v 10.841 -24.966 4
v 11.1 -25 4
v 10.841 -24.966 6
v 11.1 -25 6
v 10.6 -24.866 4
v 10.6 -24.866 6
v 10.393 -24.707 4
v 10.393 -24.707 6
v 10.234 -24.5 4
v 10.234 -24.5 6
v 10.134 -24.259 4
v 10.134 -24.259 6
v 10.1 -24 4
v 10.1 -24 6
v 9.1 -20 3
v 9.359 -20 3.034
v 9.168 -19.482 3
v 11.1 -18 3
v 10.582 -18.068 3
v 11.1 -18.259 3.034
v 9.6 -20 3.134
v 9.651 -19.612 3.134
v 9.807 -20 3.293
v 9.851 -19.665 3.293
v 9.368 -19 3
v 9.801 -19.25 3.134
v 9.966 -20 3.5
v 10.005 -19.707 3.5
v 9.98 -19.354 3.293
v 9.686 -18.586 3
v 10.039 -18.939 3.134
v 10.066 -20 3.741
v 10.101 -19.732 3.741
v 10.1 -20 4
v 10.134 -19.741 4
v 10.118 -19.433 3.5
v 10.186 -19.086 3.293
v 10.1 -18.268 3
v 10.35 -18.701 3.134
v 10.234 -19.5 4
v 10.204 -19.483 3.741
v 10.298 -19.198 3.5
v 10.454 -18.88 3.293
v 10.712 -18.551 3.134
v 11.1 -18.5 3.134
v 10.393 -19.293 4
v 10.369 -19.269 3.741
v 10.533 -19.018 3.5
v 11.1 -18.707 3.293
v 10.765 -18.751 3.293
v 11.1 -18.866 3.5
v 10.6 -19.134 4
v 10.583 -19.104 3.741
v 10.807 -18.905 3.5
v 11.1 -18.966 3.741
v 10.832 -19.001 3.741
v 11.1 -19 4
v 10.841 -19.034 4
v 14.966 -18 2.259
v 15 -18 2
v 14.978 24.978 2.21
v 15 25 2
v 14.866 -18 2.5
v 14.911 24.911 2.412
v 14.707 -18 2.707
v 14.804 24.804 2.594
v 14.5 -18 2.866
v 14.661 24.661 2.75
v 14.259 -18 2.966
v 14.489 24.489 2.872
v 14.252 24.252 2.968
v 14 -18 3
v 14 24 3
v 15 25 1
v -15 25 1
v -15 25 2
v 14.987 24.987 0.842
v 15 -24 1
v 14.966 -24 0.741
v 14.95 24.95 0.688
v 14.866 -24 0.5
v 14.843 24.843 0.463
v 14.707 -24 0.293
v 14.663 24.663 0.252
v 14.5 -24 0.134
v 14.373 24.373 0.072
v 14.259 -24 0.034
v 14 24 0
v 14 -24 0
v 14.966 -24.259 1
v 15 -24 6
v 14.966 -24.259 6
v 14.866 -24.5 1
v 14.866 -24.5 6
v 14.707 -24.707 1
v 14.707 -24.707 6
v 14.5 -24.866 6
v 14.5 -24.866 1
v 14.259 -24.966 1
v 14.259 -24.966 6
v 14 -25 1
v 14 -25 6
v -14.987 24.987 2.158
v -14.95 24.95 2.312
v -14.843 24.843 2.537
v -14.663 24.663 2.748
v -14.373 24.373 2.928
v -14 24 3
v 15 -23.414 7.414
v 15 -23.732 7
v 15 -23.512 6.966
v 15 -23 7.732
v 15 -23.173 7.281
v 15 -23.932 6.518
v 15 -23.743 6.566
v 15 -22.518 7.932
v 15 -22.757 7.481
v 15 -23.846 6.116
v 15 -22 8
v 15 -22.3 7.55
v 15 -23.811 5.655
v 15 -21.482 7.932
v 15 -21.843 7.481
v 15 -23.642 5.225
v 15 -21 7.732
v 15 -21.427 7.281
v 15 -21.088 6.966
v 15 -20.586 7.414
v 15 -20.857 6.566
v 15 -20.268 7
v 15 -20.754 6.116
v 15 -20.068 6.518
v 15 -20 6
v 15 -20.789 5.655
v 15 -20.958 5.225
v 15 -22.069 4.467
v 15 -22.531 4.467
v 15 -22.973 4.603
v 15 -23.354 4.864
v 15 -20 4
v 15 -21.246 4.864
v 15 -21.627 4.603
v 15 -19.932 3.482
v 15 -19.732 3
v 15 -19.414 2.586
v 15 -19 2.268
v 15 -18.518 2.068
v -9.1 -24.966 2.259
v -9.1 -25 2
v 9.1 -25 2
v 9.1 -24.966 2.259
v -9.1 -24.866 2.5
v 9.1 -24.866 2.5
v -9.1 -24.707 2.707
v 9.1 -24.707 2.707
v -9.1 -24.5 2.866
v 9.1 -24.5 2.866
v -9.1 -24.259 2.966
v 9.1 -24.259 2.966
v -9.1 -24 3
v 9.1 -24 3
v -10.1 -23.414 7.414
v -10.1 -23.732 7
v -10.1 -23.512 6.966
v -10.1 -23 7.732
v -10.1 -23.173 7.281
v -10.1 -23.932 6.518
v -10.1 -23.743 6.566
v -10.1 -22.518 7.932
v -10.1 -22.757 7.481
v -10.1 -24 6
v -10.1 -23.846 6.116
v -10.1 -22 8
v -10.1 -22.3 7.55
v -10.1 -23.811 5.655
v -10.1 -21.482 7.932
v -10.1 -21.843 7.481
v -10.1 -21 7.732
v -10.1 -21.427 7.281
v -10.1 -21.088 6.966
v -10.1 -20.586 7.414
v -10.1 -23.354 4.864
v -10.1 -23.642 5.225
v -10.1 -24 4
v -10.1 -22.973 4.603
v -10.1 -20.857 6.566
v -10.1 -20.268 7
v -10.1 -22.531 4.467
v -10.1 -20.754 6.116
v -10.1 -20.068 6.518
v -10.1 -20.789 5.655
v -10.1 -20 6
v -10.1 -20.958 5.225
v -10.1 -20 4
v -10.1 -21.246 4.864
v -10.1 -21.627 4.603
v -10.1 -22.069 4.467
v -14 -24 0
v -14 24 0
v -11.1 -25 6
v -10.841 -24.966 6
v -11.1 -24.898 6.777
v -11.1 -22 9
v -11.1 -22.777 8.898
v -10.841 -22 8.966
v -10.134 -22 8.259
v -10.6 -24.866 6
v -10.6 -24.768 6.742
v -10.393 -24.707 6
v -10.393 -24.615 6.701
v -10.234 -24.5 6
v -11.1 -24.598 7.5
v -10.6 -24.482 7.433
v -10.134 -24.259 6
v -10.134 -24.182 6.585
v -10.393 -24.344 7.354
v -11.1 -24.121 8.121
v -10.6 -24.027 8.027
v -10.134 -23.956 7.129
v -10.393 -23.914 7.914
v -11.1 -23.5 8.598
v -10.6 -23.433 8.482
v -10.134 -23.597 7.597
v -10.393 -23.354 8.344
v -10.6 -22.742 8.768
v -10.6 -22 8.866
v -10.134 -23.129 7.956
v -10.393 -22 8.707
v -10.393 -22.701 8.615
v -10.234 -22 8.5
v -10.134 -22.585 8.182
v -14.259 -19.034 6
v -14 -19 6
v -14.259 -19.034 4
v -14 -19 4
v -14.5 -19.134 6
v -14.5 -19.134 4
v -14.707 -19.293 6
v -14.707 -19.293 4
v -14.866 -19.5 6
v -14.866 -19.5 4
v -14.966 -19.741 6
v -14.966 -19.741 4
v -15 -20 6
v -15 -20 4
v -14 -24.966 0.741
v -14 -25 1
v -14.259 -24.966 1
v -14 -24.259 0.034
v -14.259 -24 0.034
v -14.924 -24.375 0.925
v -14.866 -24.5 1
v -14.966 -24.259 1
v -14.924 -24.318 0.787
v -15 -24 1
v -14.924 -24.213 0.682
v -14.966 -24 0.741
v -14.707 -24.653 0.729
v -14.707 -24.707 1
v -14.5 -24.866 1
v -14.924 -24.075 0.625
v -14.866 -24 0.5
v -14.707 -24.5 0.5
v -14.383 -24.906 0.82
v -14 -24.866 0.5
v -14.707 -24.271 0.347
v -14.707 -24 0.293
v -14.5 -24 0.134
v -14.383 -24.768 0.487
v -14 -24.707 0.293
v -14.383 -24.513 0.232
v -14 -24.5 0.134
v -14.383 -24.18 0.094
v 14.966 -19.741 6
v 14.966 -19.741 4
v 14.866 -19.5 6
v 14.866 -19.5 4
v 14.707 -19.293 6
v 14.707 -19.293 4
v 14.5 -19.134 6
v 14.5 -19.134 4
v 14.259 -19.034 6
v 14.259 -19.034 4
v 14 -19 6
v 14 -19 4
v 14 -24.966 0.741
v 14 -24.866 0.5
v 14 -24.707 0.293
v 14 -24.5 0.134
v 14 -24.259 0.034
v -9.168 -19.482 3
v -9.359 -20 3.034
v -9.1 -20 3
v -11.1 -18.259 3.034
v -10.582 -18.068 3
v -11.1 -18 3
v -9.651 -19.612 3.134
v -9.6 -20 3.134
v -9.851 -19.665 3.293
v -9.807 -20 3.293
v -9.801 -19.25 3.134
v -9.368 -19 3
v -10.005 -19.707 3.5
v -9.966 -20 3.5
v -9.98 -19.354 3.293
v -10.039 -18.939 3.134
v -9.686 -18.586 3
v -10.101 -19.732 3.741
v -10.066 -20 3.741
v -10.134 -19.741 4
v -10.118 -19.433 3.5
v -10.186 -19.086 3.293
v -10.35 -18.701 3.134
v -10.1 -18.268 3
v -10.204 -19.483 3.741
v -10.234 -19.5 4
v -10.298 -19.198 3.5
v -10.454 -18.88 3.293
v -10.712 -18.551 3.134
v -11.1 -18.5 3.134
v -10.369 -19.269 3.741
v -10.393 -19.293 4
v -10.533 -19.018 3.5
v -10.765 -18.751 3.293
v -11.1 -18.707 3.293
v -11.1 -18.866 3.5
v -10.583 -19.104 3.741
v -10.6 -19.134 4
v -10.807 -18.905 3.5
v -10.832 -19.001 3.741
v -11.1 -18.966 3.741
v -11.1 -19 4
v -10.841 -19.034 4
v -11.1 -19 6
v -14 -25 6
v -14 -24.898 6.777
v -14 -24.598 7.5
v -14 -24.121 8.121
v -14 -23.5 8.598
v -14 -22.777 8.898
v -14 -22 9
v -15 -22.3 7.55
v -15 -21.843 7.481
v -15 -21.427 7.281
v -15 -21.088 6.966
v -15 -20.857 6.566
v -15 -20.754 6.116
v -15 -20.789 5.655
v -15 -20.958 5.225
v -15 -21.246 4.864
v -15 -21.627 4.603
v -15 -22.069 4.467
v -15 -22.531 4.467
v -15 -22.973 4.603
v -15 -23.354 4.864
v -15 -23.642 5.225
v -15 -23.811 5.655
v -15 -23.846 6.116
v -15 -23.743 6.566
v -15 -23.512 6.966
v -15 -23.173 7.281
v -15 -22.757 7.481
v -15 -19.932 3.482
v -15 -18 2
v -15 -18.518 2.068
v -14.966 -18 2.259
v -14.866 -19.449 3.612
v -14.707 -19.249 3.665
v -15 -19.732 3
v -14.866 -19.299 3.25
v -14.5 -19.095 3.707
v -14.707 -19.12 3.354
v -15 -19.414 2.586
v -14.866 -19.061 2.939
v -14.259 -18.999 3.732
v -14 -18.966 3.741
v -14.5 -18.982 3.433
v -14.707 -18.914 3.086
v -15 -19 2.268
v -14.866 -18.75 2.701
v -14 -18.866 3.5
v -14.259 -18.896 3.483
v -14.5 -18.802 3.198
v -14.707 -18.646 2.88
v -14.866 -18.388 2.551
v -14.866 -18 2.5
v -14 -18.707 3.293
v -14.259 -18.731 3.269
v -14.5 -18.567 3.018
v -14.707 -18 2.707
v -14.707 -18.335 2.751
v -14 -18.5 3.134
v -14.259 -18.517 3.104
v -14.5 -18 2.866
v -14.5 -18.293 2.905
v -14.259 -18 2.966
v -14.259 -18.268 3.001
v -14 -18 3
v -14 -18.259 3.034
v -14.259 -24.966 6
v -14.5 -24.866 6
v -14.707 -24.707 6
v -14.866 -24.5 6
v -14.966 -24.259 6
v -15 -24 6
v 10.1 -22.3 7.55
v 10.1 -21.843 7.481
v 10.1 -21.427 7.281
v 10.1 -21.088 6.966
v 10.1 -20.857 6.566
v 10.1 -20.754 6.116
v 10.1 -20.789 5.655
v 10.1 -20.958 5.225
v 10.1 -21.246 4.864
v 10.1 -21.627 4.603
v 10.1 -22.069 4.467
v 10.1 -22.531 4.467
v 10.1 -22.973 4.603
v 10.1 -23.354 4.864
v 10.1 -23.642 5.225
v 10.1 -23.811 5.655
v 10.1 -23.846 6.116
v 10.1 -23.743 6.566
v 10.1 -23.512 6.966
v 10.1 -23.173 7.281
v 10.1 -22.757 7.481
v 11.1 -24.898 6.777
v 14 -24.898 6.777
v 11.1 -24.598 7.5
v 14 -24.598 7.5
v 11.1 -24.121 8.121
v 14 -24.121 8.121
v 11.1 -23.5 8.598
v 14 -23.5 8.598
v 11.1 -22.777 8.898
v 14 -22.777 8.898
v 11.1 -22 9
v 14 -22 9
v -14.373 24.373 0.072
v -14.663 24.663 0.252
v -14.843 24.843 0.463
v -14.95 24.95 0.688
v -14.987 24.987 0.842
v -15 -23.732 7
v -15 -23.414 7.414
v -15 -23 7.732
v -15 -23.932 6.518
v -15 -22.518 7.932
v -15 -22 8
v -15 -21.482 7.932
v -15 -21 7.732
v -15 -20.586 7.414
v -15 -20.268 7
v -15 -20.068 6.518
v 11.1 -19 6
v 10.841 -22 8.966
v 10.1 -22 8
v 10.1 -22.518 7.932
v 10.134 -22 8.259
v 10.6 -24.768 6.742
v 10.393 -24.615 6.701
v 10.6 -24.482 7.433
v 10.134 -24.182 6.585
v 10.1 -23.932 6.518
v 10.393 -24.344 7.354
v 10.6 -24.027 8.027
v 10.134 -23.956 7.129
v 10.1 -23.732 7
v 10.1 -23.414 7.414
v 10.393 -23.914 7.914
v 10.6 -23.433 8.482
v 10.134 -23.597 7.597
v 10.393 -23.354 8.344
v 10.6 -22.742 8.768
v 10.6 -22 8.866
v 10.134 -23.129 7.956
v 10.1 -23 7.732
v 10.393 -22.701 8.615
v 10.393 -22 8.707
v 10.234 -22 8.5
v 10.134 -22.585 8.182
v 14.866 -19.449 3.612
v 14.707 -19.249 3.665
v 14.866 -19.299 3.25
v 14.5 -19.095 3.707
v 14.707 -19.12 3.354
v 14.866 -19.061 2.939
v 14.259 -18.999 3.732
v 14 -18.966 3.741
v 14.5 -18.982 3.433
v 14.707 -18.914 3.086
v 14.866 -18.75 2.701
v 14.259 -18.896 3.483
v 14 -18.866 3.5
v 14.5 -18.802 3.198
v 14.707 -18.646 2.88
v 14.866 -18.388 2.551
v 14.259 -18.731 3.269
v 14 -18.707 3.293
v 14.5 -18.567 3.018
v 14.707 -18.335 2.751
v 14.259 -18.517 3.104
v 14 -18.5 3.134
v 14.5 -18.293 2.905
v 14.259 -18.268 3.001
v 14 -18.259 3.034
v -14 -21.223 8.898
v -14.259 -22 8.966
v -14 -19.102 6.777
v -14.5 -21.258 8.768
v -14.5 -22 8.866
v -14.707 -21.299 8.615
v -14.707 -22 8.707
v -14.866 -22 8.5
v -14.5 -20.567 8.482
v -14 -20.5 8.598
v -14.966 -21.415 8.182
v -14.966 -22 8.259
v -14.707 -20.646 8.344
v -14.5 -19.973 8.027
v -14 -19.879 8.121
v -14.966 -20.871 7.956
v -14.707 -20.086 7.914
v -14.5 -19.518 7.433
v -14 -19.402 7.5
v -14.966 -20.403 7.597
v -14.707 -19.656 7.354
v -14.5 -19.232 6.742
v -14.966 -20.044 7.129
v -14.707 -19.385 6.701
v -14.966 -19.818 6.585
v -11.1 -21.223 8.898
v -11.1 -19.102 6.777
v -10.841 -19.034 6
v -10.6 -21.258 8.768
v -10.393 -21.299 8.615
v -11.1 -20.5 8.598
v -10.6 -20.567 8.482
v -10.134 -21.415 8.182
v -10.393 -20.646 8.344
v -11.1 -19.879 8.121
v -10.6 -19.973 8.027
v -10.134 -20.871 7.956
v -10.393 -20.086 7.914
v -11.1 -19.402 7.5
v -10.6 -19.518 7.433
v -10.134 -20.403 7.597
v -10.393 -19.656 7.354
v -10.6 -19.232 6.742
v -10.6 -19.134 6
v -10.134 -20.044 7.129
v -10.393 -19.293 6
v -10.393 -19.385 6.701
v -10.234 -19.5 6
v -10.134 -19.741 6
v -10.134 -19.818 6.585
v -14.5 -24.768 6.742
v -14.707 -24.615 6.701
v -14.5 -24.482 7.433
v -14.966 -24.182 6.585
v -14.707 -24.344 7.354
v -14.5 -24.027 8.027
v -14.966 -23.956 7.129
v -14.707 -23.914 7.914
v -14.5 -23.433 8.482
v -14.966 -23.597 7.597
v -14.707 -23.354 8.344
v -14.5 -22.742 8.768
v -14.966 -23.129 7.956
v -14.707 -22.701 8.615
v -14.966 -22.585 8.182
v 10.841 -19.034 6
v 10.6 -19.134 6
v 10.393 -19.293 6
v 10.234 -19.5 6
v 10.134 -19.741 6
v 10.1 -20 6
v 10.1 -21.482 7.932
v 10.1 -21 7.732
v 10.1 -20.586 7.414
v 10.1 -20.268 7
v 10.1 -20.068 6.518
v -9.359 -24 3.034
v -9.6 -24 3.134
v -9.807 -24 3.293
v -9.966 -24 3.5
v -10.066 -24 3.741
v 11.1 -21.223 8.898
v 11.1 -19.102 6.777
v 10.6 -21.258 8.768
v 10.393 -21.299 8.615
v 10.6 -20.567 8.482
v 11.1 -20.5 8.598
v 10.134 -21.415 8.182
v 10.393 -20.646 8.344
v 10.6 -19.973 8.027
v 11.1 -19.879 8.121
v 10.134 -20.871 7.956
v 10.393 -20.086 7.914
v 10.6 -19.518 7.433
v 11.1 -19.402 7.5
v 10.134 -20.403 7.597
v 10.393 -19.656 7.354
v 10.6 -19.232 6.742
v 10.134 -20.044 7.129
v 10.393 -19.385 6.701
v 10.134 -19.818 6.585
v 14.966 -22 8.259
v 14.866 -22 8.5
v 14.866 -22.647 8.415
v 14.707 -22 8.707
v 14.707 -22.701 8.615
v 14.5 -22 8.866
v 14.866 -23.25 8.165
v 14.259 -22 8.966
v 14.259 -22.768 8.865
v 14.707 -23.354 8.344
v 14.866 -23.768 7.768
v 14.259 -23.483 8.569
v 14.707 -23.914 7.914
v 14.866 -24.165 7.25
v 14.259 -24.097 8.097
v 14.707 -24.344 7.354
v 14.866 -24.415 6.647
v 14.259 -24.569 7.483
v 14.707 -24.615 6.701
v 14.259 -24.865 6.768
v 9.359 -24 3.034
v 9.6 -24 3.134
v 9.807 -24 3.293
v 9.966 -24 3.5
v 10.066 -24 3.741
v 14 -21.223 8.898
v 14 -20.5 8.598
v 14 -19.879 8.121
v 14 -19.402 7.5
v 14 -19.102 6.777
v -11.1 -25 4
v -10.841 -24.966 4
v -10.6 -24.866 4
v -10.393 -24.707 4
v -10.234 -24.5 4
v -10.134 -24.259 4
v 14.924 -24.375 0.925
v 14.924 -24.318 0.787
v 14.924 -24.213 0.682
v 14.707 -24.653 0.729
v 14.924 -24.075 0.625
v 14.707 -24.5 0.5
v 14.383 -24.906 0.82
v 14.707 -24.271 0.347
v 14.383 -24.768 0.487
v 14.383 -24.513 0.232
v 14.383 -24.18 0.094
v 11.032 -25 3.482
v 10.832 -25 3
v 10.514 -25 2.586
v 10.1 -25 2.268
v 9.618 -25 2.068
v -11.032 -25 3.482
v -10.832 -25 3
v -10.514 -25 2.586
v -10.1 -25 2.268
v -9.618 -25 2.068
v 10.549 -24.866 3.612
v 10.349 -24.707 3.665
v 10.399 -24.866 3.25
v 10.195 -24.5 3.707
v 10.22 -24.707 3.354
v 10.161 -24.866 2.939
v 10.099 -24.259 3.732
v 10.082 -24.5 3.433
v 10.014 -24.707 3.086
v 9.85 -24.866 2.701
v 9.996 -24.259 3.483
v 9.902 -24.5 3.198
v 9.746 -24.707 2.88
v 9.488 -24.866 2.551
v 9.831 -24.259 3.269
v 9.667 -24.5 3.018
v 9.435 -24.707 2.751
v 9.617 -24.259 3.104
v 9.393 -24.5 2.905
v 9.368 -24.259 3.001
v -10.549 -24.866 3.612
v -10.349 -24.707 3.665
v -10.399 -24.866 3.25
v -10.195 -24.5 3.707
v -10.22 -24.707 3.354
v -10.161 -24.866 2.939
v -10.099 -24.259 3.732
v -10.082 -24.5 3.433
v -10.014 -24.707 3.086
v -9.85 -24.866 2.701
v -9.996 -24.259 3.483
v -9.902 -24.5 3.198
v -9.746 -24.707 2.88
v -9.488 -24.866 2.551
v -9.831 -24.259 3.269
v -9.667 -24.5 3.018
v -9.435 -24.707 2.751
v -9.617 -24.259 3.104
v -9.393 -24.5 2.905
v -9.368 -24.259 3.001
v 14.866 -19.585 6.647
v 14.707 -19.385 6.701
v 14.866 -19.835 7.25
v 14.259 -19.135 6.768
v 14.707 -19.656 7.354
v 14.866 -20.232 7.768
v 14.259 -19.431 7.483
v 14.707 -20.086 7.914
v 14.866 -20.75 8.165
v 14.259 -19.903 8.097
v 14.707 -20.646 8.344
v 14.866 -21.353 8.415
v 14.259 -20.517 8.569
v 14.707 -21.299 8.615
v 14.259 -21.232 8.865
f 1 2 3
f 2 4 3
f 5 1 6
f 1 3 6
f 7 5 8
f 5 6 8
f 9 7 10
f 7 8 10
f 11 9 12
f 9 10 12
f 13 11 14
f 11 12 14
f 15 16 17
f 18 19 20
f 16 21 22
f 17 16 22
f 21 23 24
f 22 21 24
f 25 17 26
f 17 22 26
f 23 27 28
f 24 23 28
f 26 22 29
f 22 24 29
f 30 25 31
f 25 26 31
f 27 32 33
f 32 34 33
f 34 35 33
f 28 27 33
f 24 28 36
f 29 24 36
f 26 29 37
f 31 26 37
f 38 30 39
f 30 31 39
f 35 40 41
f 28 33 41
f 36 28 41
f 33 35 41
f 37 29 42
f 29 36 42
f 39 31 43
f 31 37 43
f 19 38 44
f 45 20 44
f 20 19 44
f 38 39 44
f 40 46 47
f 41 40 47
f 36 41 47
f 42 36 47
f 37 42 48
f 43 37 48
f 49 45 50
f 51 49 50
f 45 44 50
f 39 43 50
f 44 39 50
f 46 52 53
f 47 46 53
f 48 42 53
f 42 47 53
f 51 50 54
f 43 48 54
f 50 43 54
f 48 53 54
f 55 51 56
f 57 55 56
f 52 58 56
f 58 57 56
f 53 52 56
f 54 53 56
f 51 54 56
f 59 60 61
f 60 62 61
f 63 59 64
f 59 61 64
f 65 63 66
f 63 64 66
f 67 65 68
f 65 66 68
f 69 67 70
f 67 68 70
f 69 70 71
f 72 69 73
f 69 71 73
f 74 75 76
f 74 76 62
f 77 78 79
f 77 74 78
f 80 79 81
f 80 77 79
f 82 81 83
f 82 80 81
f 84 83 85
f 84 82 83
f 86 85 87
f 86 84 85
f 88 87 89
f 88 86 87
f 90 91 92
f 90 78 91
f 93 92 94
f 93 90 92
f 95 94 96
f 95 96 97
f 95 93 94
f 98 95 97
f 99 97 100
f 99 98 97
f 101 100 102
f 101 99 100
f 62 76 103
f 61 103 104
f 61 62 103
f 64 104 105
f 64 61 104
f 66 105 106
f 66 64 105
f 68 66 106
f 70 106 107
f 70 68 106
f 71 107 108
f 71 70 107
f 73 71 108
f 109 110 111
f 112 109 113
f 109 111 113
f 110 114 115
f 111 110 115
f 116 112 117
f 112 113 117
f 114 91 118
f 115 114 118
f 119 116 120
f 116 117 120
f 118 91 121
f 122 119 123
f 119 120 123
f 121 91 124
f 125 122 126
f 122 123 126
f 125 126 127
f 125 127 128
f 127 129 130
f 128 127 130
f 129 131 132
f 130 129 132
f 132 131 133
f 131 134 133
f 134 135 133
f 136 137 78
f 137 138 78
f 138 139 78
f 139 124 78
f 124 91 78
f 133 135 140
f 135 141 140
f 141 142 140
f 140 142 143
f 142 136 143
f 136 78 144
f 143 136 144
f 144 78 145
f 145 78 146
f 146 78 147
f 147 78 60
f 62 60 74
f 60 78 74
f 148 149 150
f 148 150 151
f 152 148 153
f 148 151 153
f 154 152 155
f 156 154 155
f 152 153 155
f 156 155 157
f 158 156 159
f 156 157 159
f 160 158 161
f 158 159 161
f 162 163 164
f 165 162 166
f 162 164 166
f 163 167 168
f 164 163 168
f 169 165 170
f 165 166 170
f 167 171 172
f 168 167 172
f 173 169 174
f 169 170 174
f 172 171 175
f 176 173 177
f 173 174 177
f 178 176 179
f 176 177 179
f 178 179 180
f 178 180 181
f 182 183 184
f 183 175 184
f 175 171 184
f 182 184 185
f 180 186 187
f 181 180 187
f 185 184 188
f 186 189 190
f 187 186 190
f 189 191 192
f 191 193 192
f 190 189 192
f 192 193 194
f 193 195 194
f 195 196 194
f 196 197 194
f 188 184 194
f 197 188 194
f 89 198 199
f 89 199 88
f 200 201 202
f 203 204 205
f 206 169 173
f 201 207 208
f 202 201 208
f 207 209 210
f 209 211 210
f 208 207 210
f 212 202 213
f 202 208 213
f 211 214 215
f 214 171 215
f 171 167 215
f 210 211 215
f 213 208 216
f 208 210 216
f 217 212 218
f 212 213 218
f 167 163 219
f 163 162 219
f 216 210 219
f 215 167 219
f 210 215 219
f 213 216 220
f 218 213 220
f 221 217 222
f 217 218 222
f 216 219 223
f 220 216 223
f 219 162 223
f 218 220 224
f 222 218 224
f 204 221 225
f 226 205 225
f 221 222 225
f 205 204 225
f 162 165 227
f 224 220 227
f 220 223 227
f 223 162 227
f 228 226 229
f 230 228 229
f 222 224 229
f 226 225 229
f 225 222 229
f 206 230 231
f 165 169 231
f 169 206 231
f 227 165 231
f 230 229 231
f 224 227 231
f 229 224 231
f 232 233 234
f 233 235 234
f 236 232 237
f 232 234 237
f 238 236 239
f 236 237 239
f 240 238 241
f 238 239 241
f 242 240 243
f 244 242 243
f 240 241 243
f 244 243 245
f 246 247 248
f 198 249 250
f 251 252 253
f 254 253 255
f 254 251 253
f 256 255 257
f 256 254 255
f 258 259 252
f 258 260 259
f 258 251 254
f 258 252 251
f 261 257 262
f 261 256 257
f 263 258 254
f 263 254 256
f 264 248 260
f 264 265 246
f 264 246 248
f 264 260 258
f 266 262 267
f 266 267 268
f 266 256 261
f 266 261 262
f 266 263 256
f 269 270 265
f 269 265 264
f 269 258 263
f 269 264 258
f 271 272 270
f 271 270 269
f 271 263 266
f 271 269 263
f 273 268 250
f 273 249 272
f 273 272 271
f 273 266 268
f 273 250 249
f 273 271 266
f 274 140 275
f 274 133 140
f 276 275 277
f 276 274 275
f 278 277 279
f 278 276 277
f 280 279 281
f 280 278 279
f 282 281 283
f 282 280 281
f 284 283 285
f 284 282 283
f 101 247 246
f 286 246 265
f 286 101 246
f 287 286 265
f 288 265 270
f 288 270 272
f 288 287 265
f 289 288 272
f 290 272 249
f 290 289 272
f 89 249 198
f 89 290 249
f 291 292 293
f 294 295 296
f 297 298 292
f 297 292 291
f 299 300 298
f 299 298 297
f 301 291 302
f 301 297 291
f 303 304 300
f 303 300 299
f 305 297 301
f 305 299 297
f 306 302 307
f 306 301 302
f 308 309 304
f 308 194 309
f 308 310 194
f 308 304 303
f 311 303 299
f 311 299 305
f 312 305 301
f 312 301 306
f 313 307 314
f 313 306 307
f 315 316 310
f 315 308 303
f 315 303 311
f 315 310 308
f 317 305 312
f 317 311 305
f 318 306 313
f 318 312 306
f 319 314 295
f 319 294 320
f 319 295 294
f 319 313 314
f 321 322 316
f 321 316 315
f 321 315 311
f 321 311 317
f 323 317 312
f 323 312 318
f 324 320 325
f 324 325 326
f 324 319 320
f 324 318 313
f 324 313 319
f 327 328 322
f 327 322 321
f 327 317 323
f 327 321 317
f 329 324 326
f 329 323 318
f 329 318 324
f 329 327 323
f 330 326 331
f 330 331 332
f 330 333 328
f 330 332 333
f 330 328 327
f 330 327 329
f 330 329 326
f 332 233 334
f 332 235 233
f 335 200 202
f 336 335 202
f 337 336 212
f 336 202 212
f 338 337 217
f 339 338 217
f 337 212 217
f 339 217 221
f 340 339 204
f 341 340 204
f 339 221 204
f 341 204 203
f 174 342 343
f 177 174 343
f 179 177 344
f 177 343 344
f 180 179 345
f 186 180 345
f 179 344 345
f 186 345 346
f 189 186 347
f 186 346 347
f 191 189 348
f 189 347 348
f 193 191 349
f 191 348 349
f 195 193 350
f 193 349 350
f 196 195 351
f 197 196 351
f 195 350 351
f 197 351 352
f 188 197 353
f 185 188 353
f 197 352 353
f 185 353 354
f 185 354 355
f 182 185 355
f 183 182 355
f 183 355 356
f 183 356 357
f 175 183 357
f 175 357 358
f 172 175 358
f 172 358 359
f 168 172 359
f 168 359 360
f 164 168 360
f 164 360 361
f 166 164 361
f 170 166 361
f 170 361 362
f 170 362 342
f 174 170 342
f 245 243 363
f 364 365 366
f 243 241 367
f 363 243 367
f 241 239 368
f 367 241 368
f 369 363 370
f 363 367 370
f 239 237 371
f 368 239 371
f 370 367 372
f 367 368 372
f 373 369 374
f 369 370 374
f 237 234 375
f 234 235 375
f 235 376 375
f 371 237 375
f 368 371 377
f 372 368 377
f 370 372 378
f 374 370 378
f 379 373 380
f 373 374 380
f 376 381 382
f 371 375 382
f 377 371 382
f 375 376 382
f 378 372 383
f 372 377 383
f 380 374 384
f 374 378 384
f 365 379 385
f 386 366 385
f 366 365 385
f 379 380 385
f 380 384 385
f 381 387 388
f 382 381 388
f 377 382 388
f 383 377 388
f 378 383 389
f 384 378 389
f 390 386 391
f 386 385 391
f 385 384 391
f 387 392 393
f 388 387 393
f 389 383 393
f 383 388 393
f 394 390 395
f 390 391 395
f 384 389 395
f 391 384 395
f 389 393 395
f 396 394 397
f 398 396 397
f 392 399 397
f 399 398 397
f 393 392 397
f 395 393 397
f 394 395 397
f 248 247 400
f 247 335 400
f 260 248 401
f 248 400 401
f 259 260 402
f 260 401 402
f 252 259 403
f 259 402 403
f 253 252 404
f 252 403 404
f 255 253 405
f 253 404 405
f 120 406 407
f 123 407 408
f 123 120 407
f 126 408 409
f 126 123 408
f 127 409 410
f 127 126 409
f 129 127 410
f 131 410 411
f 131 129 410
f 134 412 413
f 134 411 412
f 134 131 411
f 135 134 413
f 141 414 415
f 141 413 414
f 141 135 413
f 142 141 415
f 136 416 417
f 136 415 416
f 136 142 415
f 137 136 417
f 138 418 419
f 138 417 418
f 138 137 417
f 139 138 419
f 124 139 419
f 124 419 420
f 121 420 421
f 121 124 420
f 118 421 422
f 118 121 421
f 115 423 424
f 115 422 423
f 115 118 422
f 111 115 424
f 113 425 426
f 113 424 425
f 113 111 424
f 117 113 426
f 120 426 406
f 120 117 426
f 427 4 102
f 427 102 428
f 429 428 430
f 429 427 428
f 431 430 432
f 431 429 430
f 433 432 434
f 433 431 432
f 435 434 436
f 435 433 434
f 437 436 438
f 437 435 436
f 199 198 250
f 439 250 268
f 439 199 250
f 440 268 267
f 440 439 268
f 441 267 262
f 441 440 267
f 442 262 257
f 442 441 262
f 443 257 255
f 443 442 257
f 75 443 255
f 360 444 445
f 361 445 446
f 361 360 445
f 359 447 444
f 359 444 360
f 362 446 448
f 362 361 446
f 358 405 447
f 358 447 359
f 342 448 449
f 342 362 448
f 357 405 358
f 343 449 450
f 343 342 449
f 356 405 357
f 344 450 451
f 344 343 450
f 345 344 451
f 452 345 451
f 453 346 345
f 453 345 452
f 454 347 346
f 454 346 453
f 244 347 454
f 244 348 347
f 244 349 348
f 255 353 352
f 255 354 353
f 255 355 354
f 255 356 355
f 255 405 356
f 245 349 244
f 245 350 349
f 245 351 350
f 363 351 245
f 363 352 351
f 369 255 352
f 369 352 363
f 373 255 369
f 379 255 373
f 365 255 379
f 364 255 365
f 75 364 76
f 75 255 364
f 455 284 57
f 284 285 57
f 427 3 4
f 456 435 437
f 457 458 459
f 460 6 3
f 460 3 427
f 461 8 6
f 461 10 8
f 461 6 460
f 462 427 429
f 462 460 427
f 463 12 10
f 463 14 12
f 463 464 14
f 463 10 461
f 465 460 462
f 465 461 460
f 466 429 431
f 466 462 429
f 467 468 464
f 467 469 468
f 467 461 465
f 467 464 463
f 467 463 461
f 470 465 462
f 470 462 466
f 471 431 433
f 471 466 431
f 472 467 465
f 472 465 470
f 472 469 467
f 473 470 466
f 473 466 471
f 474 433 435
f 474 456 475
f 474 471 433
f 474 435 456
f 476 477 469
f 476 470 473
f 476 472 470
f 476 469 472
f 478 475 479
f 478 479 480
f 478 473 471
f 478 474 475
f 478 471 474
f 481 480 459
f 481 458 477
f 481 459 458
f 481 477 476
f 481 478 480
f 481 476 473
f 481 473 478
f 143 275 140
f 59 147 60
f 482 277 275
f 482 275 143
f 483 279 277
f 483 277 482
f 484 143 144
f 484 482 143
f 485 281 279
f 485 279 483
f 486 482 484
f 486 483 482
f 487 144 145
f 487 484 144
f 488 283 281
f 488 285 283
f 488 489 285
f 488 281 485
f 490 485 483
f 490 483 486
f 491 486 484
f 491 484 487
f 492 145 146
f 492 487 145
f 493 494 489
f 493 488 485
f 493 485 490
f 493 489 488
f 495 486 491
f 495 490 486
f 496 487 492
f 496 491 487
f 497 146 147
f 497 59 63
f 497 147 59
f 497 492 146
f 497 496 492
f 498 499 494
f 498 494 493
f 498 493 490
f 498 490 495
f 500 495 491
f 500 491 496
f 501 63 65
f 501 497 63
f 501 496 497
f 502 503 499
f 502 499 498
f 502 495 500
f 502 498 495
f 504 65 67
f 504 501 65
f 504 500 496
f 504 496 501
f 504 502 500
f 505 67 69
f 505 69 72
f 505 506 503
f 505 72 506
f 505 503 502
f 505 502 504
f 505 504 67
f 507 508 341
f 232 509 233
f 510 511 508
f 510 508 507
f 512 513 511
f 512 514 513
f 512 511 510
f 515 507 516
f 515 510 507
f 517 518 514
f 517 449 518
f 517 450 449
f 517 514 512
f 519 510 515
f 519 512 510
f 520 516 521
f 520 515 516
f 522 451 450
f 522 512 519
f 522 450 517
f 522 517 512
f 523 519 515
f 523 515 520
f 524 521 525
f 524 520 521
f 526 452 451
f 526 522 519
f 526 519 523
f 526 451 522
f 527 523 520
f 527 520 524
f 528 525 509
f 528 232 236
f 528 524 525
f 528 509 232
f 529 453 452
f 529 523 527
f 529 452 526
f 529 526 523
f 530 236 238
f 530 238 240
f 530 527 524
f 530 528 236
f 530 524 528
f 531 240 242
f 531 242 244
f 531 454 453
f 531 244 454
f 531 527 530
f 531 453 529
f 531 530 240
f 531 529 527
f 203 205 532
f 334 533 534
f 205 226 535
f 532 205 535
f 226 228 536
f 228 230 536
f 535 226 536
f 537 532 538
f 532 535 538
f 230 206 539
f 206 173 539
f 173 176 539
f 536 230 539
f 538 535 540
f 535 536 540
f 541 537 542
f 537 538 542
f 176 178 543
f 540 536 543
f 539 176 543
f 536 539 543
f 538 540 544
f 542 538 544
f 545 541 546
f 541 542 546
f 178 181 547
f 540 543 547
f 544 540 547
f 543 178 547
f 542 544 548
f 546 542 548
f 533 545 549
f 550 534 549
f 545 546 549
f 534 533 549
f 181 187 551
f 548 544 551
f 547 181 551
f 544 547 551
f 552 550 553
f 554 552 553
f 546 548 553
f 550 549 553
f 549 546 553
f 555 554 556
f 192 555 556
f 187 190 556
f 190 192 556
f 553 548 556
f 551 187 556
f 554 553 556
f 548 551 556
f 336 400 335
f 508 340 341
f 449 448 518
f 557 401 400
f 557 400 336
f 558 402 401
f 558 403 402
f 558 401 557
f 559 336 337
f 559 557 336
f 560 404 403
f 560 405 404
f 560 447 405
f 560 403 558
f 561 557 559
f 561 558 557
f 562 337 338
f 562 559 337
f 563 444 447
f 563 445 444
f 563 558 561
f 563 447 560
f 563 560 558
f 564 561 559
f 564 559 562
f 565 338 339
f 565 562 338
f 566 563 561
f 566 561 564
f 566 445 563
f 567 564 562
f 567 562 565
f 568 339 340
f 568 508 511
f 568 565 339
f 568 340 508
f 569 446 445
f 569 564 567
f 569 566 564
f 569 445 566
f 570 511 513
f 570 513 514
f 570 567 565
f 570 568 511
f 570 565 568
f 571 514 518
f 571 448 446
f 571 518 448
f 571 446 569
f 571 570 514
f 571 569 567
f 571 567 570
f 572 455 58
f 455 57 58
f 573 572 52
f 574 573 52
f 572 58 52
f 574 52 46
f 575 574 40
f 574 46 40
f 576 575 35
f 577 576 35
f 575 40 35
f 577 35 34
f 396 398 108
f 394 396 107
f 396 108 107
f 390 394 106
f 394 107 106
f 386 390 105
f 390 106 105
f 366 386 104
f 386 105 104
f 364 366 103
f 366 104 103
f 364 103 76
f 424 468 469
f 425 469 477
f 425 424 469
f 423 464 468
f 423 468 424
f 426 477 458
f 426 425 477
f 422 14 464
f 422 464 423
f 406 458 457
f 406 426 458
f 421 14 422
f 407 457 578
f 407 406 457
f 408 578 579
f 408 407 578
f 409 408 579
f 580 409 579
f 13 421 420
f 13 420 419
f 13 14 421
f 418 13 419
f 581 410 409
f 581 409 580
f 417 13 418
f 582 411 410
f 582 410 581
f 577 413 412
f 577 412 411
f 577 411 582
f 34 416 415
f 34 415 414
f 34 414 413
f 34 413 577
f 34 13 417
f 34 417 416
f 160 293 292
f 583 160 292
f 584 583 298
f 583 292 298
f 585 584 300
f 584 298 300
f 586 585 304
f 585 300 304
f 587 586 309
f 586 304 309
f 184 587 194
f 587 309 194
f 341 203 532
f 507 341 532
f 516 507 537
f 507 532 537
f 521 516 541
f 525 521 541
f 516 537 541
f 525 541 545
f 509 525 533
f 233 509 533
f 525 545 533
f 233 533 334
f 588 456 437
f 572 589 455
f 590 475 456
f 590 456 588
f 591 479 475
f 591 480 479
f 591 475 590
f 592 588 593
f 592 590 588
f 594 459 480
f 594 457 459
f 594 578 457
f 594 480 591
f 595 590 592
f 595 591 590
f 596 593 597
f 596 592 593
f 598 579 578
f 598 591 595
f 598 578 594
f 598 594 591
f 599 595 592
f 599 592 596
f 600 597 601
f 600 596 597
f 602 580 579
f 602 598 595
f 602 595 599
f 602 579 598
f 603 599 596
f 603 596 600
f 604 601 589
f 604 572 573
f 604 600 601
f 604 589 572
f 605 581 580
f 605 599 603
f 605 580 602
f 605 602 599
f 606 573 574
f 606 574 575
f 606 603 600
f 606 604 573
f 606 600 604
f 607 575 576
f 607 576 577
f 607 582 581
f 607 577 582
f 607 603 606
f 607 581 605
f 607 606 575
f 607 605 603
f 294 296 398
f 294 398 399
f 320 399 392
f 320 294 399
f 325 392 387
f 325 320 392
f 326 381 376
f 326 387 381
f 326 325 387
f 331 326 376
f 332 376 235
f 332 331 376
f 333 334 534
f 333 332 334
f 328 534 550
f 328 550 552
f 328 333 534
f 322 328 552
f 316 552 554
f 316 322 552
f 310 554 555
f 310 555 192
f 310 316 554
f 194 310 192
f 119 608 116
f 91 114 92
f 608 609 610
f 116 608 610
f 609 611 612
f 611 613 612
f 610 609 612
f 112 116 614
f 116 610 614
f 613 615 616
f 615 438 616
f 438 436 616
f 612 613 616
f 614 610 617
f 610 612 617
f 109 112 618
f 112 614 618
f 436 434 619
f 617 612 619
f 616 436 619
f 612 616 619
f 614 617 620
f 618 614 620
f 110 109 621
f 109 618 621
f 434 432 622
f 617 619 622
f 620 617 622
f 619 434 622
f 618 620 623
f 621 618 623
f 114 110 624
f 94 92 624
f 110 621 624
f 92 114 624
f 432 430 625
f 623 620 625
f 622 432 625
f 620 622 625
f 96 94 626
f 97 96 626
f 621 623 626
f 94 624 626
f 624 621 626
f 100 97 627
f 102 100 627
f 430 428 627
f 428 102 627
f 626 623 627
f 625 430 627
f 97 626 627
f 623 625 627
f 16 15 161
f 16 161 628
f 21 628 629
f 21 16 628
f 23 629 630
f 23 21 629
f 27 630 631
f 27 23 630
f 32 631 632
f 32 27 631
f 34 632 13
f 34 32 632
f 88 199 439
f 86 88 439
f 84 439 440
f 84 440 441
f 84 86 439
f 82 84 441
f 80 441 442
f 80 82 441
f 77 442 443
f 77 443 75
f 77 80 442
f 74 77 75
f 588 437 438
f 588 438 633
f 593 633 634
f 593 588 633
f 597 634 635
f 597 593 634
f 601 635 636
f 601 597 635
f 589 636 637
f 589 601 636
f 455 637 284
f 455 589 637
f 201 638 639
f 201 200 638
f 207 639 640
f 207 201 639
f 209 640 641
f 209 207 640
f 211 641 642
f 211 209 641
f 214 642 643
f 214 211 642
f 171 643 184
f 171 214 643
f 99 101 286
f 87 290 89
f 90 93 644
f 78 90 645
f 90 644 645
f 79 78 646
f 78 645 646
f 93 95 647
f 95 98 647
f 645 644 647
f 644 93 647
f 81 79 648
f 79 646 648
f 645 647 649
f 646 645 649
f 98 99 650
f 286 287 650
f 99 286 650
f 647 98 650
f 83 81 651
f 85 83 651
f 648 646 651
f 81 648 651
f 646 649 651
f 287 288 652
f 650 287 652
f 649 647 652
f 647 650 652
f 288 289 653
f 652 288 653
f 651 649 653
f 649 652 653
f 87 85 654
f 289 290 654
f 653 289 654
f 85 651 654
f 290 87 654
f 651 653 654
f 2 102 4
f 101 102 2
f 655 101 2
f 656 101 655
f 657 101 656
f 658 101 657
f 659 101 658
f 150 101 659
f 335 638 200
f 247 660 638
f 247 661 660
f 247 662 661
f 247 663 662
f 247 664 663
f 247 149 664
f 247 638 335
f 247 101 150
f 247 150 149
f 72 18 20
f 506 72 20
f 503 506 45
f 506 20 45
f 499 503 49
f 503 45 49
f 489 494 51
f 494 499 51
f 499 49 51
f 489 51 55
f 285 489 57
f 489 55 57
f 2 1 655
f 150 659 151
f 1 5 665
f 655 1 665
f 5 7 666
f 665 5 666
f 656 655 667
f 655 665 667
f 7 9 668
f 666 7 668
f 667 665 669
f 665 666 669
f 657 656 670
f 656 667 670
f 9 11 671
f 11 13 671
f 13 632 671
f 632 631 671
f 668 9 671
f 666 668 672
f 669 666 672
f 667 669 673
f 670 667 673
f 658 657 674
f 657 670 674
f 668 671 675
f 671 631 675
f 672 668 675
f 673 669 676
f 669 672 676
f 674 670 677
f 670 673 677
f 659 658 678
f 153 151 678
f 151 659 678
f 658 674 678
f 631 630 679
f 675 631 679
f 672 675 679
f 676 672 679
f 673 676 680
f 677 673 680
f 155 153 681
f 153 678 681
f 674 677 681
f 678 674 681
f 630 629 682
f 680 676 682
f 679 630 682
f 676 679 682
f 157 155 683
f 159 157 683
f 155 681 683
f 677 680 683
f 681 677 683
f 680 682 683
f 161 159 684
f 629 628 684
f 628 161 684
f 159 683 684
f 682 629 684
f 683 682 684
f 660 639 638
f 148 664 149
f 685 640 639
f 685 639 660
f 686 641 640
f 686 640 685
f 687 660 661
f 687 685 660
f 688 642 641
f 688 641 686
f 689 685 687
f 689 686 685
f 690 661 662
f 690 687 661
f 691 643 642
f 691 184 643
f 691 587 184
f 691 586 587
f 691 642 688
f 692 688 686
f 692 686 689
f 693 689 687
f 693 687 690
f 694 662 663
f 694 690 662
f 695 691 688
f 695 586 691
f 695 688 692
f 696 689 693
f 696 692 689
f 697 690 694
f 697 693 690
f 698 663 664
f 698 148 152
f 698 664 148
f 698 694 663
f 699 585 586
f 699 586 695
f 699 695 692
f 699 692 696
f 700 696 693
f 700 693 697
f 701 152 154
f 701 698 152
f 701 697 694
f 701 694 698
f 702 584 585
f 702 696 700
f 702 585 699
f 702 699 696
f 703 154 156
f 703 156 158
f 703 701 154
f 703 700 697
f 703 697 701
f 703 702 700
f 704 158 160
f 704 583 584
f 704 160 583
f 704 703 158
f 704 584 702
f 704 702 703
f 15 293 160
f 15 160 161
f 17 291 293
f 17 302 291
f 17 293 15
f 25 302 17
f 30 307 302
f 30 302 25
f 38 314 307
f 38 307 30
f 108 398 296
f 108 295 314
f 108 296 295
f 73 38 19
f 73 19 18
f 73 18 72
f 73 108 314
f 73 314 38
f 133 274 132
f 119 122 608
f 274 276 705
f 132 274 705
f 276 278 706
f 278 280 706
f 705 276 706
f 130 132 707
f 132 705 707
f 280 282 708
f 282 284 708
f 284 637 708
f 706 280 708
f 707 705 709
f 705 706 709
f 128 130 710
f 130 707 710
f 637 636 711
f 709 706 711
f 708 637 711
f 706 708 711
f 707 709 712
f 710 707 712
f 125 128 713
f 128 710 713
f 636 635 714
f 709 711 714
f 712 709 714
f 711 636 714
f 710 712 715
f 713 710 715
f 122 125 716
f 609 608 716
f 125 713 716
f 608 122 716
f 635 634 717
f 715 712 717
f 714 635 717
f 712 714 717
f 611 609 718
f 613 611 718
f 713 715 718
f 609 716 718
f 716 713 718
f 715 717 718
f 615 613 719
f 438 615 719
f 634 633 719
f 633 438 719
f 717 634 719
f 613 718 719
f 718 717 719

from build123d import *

# Parameters (mm, degrees)
SKETCH1_W           = 30
SKETCH1_H           = 50
BOSS_EXTRUDE1_DEPTH = 3
SKETCH2_W           = 4.9
SKETCH2_H           = 6
BOSS_EXTRUDE2_DEPTH = 6
SKETCH3_R           = 1.55
CUT_EXTRUDE1_DEPTH  = 41.074929819
FILLET1_R           = 3
FILLET2_R           = 1


with BuildPart() as part:
    # Sketch1 → Boss-Extrude1 (new body)
    with BuildSketch(Plane.XY):
        Rectangle(SKETCH1_W, SKETCH1_H)
    extrude(amount=BOSS_EXTRUDE1_DEPTH)

    # Sketch2 → Boss-Extrude2 (add)
    with BuildSketch(Plane.XY.offset(3)):
        with Locations((-12.55, -22)):
            Rectangle(SKETCH2_W, SKETCH2_H)
    boss_extrude2 = extrude(amount=BOSS_EXTRUDE2_DEPTH)

    # Sketch3 → Cut-Extrude1 (cut, through all)
    with BuildSketch(Plane.ZY.offset(15)):
        with Locations((6, -22.3)):
            Circle(SKETCH3_R)
    cut_extrude1 = extrude(amount=-CUT_EXTRUDE1_DEPTH, mode=Mode.SUBTRACT)

    # Mirror1: Boss-Extrude2, Cut-Extrude1 across plane
    add(boss_extrude2.mirror(Plane(origin=(0, 0, 0), x_dir=(0, 0, 1), z_dir=(1, 0, 0))))
    add(cut_extrude1.mirror(Plane(origin=(0, 0, 0), x_dir=(0, 0, 1), z_dir=(1, 0, 0))), mode=Mode.SUBTRACT)

    # Fillet1
    fillet1_edges = [part.edges().sort_by_distance(p)[0] for p in [
        (12.55, -19, 9),
        (12.55, -25, 9),
        (-12.55, -19, 9),
        (-12.55, -25, 9),
    ]]
    fillet(fillet1_edges, radius=FILLET1_R - 0.0001)  # a hair under: the kernel refuses the full size

    # Fillet2
    fillet2_edges = [part.edges().sort_by_distance(p)[0] for p in [
        (-15, 3, 3),
        (0, -25, 3),
        (-10.1, -22, 3),
        (-12.55, -19, 3),
        (15, 3, 3),
        (10.1, -22, 3),
        (12.55, -19, 3),
        (0, -25, 0),
        (15, -25, 3.00005),
        (10.1, -25, 4.50005),
        (-10.1, -25, 4.50005),
        (-15, -25, 3.00005),
        (10.1, -19, 4.50005),
        (-15, 0, 0),
        (10.1, -19.878650367, 8.121349633),
        (10.1, -24.121349633, 8.121349633),
        (15, -19, 4.50005),
        (15, -19.878650367, 8.121349633),
        (15, -24.121349633, 8.121349633),
        (-15, -19, 4.50005),
        (-15, -24.121349633, 8.121349633),
        (0, 25, 0),
        (-15, -19.878650367, 8.121349633),
        (-10.1, -19, 4.50005),
        (-10.1, -24.121349633, 8.121349633),
        (-10.1, -19.878650367, 8.121349633),
        (15, 0, 0),
        (0, 25, 3),
    ]]
    fillet(fillet2_edges, radius=FILLET2_R)


solid = part.part
